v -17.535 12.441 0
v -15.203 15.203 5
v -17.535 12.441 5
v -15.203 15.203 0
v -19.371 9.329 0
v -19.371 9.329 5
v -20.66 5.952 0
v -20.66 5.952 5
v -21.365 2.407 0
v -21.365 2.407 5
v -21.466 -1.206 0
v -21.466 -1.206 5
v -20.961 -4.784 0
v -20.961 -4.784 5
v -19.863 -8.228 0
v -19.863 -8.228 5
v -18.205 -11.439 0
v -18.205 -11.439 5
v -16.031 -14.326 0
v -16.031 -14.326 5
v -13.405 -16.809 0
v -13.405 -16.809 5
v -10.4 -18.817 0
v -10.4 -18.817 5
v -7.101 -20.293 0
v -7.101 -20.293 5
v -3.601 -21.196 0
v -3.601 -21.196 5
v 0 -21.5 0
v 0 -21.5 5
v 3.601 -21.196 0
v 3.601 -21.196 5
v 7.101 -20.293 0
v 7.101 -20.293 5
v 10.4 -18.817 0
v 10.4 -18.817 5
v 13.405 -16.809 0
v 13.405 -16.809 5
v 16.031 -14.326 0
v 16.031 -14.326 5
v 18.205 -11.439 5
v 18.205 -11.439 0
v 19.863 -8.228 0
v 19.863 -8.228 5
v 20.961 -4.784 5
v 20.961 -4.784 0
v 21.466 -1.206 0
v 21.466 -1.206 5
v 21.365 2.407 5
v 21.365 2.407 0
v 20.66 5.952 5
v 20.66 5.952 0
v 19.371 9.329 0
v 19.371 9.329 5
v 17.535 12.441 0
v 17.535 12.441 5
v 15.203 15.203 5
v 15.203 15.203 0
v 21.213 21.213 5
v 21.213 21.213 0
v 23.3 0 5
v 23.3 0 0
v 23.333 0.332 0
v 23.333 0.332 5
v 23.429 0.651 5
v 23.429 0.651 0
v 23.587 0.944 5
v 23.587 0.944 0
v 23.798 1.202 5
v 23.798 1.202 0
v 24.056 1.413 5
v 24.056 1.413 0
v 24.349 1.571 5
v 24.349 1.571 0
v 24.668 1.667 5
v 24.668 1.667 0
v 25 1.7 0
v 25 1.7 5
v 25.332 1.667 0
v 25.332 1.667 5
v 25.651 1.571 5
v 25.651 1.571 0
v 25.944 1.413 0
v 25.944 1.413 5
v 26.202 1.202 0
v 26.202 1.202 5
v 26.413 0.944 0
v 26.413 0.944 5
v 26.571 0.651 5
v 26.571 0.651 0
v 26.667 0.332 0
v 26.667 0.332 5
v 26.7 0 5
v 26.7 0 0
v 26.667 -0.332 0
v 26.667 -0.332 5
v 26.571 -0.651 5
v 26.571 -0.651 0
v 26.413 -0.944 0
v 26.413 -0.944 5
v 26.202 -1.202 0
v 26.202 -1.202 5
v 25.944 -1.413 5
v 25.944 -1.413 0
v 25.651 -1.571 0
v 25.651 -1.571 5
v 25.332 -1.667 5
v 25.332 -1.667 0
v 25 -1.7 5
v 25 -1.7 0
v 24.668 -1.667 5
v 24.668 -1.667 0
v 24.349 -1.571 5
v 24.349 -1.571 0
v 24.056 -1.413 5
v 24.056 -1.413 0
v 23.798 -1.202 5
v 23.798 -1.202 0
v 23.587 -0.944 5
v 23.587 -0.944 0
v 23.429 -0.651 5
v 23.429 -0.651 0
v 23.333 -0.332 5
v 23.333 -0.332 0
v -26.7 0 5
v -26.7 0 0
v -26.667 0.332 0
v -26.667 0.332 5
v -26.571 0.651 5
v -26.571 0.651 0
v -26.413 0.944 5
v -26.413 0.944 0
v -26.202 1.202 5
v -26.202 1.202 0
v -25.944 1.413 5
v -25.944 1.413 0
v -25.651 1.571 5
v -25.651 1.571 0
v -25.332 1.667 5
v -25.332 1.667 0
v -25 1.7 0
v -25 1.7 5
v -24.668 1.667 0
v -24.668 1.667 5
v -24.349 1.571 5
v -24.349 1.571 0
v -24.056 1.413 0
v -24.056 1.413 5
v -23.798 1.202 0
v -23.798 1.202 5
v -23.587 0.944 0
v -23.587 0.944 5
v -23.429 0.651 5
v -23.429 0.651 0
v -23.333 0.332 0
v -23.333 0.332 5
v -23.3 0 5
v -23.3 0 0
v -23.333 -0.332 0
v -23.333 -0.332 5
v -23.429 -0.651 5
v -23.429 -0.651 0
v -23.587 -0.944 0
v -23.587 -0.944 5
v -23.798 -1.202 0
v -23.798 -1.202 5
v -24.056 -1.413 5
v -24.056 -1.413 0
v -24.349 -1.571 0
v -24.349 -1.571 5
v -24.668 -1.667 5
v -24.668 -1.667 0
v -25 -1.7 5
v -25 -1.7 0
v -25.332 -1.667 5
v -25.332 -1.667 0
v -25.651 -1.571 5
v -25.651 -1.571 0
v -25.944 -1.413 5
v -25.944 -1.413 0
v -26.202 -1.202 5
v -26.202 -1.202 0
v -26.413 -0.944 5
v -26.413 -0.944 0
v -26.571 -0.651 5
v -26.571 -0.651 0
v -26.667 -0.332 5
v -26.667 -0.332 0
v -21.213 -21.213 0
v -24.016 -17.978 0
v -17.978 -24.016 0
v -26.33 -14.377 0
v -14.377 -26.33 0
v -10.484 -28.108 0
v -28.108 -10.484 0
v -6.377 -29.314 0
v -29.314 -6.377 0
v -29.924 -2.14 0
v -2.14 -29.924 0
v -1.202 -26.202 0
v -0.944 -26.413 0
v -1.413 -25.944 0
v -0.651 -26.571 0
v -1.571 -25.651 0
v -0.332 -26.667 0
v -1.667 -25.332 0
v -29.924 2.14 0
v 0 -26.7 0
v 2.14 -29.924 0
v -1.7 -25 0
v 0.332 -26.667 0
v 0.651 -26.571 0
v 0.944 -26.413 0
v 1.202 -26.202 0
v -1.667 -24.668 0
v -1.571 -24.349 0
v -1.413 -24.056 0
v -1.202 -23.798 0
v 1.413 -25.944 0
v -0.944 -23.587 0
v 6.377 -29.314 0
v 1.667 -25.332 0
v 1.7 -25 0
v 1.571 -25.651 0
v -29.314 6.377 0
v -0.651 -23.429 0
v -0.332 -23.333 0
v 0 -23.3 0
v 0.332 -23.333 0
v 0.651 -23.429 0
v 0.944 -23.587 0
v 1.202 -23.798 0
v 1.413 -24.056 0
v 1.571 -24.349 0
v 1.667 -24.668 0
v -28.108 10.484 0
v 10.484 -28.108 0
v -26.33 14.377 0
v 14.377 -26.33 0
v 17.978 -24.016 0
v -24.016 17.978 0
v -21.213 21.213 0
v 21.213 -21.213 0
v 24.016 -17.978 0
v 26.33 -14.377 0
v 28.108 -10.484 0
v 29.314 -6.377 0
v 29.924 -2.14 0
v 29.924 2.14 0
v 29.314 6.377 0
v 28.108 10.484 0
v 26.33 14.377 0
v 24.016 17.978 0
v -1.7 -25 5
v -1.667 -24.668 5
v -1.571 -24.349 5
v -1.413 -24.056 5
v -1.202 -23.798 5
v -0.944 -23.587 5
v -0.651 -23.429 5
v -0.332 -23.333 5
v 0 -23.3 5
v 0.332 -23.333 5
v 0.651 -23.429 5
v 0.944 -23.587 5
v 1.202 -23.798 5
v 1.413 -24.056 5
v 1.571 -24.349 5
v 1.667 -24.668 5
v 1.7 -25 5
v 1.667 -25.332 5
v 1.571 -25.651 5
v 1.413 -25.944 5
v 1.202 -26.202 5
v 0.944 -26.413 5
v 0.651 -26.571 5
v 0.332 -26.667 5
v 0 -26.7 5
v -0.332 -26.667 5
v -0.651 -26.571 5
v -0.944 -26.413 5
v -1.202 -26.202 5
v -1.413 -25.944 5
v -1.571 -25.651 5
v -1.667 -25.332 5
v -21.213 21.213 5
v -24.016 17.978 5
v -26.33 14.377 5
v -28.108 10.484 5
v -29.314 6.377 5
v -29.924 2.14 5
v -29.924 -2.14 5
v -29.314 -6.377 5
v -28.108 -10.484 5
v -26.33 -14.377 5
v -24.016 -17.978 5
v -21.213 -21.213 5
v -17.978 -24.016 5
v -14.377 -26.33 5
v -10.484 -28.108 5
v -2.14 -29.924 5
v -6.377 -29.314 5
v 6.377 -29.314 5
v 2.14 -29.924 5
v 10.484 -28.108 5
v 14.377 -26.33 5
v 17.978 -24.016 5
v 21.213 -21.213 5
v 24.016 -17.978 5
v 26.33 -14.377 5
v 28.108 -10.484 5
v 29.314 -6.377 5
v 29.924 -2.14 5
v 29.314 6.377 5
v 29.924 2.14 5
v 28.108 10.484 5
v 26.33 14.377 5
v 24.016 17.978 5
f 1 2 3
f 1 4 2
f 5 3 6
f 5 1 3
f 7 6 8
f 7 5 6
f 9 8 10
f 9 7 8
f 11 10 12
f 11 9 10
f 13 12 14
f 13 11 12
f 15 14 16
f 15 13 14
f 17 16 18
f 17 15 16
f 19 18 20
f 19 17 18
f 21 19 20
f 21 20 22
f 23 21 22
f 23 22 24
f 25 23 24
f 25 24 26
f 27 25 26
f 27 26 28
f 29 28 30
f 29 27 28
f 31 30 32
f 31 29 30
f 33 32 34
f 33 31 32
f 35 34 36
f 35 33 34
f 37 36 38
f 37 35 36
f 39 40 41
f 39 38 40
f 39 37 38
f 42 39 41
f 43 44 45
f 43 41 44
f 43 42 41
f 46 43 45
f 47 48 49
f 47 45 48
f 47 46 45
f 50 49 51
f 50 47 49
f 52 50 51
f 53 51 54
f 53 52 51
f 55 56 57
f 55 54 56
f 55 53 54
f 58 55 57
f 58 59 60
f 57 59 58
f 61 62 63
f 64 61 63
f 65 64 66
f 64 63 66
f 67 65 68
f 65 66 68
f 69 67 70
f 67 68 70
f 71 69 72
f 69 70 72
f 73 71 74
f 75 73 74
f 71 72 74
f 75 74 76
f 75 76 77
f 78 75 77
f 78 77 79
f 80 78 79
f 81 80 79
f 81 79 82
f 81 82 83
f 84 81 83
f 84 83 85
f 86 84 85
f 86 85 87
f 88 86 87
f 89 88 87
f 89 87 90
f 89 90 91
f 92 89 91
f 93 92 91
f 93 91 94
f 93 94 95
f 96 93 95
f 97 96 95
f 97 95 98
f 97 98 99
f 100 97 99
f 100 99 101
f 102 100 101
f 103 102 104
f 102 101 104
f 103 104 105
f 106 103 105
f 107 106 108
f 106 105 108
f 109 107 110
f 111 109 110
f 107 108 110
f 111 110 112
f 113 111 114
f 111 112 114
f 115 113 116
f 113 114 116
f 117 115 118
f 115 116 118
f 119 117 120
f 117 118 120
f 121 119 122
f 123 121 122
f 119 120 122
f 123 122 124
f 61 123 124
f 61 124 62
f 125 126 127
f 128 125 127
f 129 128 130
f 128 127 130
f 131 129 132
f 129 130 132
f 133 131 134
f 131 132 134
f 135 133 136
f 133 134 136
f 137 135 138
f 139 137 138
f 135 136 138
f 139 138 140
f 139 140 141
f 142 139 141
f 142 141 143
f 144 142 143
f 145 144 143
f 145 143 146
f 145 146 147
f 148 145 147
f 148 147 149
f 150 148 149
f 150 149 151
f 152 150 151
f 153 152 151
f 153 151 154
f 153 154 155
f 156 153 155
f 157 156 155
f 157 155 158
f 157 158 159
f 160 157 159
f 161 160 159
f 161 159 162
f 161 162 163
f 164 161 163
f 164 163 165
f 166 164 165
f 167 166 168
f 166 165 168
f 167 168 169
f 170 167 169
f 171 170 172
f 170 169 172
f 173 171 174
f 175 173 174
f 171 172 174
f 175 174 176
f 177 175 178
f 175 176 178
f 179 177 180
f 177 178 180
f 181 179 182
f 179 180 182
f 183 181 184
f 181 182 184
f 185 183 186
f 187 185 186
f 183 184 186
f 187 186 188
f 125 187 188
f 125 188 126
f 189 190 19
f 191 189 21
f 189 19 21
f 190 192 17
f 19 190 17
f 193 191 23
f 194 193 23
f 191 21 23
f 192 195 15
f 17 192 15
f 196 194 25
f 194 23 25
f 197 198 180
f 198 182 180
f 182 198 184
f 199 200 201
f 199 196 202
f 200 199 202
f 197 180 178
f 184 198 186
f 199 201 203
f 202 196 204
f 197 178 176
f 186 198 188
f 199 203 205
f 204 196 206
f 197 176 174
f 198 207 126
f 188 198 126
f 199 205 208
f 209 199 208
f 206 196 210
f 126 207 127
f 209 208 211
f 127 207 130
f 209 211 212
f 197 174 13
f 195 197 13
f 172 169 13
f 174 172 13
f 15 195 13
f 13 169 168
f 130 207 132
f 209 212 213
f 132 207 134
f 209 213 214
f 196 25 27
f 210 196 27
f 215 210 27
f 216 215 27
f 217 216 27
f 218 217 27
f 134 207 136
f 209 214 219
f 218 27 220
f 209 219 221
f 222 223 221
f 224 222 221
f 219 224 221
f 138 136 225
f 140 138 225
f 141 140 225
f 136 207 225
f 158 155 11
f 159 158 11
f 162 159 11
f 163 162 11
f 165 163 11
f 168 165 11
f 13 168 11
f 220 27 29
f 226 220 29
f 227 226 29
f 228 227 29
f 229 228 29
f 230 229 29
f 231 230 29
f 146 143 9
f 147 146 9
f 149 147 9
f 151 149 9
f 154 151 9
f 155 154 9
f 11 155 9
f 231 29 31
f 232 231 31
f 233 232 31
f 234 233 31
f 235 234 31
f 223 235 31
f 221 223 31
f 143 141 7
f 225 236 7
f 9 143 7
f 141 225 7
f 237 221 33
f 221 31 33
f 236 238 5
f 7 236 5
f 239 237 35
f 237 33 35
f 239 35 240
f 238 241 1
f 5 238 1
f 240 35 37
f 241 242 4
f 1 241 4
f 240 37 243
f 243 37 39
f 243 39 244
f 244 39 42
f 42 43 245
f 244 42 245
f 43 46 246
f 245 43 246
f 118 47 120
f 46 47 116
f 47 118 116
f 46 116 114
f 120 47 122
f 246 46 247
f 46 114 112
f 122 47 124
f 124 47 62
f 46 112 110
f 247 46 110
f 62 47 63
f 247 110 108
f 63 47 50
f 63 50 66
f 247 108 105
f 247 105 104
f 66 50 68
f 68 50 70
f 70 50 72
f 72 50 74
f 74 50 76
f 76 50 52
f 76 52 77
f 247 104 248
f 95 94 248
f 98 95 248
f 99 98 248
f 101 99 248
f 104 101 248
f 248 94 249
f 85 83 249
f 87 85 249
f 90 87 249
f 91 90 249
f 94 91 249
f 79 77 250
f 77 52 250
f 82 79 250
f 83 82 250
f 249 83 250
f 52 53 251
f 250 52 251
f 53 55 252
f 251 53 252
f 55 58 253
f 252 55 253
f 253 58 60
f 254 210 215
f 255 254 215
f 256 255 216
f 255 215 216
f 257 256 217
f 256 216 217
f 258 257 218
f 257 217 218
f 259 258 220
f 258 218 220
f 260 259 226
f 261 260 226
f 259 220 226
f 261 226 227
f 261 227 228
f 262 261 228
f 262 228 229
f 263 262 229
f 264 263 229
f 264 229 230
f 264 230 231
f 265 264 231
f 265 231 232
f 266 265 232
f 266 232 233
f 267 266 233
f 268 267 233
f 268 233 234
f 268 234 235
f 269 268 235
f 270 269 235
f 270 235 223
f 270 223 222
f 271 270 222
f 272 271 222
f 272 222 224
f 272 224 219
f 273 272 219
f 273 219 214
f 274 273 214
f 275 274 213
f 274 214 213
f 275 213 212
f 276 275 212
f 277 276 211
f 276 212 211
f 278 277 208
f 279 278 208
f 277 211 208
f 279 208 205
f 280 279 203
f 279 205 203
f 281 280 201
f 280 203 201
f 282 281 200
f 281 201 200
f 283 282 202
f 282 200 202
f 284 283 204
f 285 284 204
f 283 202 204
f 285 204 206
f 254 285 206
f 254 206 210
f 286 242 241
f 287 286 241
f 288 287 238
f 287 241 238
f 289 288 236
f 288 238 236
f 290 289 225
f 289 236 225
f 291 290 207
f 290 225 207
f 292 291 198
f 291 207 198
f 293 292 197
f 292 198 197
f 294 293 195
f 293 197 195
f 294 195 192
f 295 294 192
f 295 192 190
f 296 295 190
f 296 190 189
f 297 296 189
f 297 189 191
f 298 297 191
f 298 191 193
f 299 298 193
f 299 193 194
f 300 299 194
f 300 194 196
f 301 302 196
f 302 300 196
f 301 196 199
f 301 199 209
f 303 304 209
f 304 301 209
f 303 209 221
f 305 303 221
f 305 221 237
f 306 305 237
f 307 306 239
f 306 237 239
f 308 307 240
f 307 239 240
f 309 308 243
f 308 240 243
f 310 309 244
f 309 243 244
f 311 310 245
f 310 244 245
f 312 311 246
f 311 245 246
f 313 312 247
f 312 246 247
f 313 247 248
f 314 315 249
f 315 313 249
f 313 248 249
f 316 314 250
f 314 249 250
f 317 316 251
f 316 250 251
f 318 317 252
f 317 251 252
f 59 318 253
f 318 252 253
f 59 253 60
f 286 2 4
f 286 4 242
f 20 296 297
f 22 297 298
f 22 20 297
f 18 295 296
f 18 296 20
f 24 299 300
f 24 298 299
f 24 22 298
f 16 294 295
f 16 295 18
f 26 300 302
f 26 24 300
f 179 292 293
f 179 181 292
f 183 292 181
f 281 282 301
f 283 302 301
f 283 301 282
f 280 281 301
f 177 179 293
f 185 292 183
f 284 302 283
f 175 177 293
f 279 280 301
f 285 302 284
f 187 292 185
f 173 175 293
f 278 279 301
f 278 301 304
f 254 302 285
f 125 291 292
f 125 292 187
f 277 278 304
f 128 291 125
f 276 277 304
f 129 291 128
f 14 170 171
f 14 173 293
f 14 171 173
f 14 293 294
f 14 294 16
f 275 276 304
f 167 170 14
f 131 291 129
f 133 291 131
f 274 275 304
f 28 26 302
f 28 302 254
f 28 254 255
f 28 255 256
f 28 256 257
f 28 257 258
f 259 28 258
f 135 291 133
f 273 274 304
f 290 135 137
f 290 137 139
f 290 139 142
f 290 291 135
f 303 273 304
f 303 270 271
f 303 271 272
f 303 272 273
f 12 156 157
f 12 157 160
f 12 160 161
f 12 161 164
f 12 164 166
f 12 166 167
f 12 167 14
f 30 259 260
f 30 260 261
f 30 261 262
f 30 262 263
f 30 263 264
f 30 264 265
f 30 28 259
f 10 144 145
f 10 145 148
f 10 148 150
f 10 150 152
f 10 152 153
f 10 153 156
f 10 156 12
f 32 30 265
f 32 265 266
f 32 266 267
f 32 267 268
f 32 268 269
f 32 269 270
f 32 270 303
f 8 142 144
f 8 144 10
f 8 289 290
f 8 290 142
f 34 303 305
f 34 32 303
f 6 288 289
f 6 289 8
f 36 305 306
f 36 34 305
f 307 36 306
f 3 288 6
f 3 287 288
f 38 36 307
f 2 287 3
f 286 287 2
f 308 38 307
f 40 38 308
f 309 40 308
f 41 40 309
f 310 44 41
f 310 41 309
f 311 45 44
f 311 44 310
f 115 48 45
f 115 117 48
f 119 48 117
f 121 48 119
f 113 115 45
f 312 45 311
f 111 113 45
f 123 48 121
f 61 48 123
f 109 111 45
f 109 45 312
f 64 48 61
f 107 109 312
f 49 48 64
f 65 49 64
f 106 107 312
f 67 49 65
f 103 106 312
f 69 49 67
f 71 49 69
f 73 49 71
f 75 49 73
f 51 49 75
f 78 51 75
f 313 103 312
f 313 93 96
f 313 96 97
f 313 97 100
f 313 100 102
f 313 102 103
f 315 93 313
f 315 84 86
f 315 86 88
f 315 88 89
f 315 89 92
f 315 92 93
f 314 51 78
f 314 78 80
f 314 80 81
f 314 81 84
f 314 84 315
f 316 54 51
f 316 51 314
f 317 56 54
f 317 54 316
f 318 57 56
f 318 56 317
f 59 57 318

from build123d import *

# Parameters (mm, degrees)
SKETCH_1_R              = 30
SKETCH_1_R_2            = 21.5
EXTRUDE_1_DEPTH         = 5
HOLE_WIZARD_3_4_3_4_1_D = 3.4
CUT_EXTRUDE_1_DEPTH     = 43.720018727


with BuildPart() as part:
    # 草图1 → 凸台-拉伸1 (new body)
    with BuildSketch(Plane.XY):
        Circle(SKETCH_1_R)
        Circle(SKETCH_1_R_2, mode=Mode.SUBTRACT)
    extrude(amount=EXTRUDE_1_DEPTH)

    # Ø3.4 (3.4) 直径孔1 (through all)
    with Locations(Plane(origin=(-25, 0, 5), x_dir=(1, 0, 0), z_dir=(0, 0, 1))):
        with Locations((0, 0), (25, 25), (25, -25), (50, 0)):
            Hole(HOLE_WIZARD_3_4_3_4_1_D / 2)

    # 草图4 → 切除-拉伸1 (cut, through all)
    with BuildSketch(Plane.XY.offset(5)):
        with BuildLine():
            Line((0, 0), (-21.213203436, 21.213203436))
            ThreePointArc((-21.213203436, 21.213203436), (0, 30), (21.213203436, 21.213203436))
            Line((21.213203436, 21.213203436), (0, 0))
        make_face()
    extrude(amount=-CUT_EXTRUDE_1_DEPTH, mode=Mode.SUBTRACT)


solid = part.part
